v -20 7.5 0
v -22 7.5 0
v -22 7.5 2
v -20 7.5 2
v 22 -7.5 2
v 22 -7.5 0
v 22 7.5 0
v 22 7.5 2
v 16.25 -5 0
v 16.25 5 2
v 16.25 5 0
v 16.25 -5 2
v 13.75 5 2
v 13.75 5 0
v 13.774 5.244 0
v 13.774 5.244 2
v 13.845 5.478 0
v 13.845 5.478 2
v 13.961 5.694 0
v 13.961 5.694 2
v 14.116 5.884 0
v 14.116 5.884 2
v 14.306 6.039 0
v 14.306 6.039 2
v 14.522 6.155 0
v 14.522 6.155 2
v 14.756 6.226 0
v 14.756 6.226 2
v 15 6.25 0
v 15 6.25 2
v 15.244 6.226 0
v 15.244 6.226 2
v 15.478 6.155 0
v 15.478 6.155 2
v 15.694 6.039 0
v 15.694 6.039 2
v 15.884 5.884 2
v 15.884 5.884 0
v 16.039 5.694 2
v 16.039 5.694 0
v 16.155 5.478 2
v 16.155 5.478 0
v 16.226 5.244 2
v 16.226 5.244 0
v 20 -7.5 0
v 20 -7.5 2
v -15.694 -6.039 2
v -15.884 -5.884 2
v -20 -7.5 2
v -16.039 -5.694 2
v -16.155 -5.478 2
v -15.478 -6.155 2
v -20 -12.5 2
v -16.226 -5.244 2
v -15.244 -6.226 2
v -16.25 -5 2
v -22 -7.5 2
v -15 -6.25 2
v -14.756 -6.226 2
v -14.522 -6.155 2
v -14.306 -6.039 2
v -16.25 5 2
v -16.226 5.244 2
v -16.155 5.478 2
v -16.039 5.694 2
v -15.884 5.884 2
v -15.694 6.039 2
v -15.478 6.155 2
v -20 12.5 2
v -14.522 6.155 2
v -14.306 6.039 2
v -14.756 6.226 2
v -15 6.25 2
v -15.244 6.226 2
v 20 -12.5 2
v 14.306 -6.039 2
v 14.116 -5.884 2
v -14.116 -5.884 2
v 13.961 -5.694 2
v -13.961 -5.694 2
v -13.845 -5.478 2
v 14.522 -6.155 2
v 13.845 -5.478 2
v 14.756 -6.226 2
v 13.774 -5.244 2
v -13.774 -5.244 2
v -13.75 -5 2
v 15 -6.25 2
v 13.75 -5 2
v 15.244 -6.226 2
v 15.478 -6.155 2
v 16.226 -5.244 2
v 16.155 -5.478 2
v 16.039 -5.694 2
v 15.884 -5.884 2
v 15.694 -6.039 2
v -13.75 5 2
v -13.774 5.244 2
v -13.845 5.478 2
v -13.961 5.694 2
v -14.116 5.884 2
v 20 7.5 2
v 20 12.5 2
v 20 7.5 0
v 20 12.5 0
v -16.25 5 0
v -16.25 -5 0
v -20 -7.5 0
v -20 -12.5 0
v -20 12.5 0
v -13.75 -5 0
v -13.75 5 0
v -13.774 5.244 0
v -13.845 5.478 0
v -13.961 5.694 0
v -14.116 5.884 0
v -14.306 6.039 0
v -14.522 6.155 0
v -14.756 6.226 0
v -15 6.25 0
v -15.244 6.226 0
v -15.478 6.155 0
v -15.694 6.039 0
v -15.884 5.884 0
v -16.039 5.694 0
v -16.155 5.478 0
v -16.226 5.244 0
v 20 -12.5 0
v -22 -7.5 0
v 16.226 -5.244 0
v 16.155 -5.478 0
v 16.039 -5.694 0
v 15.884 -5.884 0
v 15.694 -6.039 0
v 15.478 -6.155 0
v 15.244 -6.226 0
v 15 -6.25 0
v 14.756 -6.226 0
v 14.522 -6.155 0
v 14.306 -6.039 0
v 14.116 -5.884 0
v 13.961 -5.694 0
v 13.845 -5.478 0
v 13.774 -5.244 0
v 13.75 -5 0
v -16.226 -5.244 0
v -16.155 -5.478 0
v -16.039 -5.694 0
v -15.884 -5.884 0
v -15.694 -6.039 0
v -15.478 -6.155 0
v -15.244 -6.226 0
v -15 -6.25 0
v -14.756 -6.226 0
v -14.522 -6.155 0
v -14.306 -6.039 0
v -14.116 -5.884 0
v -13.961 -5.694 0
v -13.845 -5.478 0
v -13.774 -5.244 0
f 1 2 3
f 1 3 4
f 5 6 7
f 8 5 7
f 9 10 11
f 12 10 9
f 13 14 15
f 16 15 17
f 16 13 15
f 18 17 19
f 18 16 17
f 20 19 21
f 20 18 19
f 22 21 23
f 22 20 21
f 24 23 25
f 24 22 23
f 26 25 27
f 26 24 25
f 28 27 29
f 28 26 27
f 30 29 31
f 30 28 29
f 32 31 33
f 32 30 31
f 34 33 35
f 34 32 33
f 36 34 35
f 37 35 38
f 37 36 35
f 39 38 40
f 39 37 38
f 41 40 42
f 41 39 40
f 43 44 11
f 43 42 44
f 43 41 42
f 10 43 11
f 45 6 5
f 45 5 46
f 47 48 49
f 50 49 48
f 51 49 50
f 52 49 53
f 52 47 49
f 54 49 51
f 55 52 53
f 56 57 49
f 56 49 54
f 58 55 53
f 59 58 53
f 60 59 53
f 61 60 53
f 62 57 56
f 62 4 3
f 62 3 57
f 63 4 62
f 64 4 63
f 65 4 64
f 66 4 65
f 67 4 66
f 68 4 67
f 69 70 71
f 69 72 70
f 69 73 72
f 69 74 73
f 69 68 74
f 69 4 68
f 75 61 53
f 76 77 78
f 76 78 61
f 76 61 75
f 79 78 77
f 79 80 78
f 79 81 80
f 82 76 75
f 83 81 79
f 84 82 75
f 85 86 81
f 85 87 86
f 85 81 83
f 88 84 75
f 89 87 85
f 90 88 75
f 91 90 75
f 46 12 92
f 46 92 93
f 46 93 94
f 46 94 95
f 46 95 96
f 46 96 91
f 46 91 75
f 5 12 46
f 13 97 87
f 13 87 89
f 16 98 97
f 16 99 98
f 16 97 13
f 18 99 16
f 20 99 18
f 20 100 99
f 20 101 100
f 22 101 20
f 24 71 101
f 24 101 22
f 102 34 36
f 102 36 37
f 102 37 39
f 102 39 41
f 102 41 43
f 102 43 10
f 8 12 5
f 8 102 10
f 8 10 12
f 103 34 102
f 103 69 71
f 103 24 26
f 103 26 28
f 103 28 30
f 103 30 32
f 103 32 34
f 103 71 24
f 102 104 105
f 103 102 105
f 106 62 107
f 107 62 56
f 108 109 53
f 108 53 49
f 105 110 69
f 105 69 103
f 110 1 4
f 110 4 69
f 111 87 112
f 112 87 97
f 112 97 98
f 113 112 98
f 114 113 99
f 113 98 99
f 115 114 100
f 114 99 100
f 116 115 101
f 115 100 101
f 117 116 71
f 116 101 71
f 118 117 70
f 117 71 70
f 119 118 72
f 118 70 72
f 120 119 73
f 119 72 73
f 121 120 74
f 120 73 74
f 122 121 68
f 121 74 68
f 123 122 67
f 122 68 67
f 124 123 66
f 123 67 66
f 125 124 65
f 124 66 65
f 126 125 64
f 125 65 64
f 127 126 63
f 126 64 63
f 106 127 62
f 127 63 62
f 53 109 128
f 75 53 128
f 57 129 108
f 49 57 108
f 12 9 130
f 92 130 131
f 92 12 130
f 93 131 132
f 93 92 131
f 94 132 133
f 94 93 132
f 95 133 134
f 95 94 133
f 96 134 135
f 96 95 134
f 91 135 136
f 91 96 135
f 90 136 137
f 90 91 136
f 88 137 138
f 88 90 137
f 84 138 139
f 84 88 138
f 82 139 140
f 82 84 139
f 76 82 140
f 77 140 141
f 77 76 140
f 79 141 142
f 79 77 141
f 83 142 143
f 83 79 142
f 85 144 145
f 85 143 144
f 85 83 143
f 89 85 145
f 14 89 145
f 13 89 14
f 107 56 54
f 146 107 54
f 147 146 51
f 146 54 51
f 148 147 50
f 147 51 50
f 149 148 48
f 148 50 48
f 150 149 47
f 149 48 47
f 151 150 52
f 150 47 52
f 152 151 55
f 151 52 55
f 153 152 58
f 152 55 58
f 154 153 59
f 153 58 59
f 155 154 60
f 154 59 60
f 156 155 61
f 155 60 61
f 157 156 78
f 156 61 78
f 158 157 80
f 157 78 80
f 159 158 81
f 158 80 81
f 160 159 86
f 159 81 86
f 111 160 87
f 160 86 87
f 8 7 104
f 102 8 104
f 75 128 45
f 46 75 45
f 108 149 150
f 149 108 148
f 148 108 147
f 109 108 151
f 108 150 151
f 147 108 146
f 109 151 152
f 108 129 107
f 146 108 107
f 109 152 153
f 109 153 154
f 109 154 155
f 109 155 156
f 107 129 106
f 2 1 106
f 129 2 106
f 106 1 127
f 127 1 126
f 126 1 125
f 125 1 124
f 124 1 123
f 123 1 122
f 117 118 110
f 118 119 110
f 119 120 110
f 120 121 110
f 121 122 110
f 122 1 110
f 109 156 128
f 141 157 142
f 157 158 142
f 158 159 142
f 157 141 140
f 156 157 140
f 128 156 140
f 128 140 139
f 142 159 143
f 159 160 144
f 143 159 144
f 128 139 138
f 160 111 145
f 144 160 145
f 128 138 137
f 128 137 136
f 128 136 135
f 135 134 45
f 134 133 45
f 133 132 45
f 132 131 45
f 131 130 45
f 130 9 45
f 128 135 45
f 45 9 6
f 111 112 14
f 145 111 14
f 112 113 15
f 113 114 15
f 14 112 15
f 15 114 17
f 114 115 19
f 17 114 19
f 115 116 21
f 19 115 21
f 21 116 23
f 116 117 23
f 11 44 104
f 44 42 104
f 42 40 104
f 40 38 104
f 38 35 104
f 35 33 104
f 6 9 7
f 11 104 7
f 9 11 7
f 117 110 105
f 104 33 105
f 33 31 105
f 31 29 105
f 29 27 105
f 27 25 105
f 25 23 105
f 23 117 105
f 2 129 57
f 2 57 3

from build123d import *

# Parameters (mm, degrees)
F0_W     = 40
F0_H     = 25
F1_DEPTH = 2
F2_W     = 2
F2_H     = 15
F3_DEPTH = 2
F5_DEPTH = 2.001


# Not quite as in the source:
# - a pattern or mirror of a feature is missing from the dataset's text; its kind, count and spacing are read off the source's solid


with BuildPart() as f1:
    # F0 (on Top) → F1 (new body)
    with BuildSketch(Plane.XY):
        Rectangle(F0_W, F0_H)
    extrude(amount=F1_DEPTH)

    # F2 (on Top) → F3 (join)
    with BuildSketch(Plane.XY):
        with Locations((-21, 0)):
            Rectangle(F2_W, F2_H)
    f3 = extrude(amount=F3_DEPTH)

    # F3_copies: F3 across plane
    add(f3.mirror(Plane(origin=(0, 0, 0), x_dir=(0, 0, 1), z_dir=(1, 0, 0))))

    # F4 (on face) → F5 (cut, through all)
    with BuildSketch(Plane.XY.offset(2)):
        with BuildLine():
            ThreePointArc((-13.75, 5), (-15, 6.25), (-16.25, 5))
            Line((-16.25, 5), (-16.25, -5))
            ThreePointArc((-16.25, -5), (-15, -6.25), (-13.75, -5))
            Line((-13.75, -5), (-13.75, 5))
        make_face()
    f5 = extrude(amount=-F5_DEPTH, mode=Mode.SUBTRACT)

    # F5_copies: F5 across plane
    add(f5.mirror(Plane(origin=(0, 0, 0), x_dir=(0, 0, 1), z_dir=(1, 0, 0))), mode=Mode.SUBTRACT)


solid = f1.part
